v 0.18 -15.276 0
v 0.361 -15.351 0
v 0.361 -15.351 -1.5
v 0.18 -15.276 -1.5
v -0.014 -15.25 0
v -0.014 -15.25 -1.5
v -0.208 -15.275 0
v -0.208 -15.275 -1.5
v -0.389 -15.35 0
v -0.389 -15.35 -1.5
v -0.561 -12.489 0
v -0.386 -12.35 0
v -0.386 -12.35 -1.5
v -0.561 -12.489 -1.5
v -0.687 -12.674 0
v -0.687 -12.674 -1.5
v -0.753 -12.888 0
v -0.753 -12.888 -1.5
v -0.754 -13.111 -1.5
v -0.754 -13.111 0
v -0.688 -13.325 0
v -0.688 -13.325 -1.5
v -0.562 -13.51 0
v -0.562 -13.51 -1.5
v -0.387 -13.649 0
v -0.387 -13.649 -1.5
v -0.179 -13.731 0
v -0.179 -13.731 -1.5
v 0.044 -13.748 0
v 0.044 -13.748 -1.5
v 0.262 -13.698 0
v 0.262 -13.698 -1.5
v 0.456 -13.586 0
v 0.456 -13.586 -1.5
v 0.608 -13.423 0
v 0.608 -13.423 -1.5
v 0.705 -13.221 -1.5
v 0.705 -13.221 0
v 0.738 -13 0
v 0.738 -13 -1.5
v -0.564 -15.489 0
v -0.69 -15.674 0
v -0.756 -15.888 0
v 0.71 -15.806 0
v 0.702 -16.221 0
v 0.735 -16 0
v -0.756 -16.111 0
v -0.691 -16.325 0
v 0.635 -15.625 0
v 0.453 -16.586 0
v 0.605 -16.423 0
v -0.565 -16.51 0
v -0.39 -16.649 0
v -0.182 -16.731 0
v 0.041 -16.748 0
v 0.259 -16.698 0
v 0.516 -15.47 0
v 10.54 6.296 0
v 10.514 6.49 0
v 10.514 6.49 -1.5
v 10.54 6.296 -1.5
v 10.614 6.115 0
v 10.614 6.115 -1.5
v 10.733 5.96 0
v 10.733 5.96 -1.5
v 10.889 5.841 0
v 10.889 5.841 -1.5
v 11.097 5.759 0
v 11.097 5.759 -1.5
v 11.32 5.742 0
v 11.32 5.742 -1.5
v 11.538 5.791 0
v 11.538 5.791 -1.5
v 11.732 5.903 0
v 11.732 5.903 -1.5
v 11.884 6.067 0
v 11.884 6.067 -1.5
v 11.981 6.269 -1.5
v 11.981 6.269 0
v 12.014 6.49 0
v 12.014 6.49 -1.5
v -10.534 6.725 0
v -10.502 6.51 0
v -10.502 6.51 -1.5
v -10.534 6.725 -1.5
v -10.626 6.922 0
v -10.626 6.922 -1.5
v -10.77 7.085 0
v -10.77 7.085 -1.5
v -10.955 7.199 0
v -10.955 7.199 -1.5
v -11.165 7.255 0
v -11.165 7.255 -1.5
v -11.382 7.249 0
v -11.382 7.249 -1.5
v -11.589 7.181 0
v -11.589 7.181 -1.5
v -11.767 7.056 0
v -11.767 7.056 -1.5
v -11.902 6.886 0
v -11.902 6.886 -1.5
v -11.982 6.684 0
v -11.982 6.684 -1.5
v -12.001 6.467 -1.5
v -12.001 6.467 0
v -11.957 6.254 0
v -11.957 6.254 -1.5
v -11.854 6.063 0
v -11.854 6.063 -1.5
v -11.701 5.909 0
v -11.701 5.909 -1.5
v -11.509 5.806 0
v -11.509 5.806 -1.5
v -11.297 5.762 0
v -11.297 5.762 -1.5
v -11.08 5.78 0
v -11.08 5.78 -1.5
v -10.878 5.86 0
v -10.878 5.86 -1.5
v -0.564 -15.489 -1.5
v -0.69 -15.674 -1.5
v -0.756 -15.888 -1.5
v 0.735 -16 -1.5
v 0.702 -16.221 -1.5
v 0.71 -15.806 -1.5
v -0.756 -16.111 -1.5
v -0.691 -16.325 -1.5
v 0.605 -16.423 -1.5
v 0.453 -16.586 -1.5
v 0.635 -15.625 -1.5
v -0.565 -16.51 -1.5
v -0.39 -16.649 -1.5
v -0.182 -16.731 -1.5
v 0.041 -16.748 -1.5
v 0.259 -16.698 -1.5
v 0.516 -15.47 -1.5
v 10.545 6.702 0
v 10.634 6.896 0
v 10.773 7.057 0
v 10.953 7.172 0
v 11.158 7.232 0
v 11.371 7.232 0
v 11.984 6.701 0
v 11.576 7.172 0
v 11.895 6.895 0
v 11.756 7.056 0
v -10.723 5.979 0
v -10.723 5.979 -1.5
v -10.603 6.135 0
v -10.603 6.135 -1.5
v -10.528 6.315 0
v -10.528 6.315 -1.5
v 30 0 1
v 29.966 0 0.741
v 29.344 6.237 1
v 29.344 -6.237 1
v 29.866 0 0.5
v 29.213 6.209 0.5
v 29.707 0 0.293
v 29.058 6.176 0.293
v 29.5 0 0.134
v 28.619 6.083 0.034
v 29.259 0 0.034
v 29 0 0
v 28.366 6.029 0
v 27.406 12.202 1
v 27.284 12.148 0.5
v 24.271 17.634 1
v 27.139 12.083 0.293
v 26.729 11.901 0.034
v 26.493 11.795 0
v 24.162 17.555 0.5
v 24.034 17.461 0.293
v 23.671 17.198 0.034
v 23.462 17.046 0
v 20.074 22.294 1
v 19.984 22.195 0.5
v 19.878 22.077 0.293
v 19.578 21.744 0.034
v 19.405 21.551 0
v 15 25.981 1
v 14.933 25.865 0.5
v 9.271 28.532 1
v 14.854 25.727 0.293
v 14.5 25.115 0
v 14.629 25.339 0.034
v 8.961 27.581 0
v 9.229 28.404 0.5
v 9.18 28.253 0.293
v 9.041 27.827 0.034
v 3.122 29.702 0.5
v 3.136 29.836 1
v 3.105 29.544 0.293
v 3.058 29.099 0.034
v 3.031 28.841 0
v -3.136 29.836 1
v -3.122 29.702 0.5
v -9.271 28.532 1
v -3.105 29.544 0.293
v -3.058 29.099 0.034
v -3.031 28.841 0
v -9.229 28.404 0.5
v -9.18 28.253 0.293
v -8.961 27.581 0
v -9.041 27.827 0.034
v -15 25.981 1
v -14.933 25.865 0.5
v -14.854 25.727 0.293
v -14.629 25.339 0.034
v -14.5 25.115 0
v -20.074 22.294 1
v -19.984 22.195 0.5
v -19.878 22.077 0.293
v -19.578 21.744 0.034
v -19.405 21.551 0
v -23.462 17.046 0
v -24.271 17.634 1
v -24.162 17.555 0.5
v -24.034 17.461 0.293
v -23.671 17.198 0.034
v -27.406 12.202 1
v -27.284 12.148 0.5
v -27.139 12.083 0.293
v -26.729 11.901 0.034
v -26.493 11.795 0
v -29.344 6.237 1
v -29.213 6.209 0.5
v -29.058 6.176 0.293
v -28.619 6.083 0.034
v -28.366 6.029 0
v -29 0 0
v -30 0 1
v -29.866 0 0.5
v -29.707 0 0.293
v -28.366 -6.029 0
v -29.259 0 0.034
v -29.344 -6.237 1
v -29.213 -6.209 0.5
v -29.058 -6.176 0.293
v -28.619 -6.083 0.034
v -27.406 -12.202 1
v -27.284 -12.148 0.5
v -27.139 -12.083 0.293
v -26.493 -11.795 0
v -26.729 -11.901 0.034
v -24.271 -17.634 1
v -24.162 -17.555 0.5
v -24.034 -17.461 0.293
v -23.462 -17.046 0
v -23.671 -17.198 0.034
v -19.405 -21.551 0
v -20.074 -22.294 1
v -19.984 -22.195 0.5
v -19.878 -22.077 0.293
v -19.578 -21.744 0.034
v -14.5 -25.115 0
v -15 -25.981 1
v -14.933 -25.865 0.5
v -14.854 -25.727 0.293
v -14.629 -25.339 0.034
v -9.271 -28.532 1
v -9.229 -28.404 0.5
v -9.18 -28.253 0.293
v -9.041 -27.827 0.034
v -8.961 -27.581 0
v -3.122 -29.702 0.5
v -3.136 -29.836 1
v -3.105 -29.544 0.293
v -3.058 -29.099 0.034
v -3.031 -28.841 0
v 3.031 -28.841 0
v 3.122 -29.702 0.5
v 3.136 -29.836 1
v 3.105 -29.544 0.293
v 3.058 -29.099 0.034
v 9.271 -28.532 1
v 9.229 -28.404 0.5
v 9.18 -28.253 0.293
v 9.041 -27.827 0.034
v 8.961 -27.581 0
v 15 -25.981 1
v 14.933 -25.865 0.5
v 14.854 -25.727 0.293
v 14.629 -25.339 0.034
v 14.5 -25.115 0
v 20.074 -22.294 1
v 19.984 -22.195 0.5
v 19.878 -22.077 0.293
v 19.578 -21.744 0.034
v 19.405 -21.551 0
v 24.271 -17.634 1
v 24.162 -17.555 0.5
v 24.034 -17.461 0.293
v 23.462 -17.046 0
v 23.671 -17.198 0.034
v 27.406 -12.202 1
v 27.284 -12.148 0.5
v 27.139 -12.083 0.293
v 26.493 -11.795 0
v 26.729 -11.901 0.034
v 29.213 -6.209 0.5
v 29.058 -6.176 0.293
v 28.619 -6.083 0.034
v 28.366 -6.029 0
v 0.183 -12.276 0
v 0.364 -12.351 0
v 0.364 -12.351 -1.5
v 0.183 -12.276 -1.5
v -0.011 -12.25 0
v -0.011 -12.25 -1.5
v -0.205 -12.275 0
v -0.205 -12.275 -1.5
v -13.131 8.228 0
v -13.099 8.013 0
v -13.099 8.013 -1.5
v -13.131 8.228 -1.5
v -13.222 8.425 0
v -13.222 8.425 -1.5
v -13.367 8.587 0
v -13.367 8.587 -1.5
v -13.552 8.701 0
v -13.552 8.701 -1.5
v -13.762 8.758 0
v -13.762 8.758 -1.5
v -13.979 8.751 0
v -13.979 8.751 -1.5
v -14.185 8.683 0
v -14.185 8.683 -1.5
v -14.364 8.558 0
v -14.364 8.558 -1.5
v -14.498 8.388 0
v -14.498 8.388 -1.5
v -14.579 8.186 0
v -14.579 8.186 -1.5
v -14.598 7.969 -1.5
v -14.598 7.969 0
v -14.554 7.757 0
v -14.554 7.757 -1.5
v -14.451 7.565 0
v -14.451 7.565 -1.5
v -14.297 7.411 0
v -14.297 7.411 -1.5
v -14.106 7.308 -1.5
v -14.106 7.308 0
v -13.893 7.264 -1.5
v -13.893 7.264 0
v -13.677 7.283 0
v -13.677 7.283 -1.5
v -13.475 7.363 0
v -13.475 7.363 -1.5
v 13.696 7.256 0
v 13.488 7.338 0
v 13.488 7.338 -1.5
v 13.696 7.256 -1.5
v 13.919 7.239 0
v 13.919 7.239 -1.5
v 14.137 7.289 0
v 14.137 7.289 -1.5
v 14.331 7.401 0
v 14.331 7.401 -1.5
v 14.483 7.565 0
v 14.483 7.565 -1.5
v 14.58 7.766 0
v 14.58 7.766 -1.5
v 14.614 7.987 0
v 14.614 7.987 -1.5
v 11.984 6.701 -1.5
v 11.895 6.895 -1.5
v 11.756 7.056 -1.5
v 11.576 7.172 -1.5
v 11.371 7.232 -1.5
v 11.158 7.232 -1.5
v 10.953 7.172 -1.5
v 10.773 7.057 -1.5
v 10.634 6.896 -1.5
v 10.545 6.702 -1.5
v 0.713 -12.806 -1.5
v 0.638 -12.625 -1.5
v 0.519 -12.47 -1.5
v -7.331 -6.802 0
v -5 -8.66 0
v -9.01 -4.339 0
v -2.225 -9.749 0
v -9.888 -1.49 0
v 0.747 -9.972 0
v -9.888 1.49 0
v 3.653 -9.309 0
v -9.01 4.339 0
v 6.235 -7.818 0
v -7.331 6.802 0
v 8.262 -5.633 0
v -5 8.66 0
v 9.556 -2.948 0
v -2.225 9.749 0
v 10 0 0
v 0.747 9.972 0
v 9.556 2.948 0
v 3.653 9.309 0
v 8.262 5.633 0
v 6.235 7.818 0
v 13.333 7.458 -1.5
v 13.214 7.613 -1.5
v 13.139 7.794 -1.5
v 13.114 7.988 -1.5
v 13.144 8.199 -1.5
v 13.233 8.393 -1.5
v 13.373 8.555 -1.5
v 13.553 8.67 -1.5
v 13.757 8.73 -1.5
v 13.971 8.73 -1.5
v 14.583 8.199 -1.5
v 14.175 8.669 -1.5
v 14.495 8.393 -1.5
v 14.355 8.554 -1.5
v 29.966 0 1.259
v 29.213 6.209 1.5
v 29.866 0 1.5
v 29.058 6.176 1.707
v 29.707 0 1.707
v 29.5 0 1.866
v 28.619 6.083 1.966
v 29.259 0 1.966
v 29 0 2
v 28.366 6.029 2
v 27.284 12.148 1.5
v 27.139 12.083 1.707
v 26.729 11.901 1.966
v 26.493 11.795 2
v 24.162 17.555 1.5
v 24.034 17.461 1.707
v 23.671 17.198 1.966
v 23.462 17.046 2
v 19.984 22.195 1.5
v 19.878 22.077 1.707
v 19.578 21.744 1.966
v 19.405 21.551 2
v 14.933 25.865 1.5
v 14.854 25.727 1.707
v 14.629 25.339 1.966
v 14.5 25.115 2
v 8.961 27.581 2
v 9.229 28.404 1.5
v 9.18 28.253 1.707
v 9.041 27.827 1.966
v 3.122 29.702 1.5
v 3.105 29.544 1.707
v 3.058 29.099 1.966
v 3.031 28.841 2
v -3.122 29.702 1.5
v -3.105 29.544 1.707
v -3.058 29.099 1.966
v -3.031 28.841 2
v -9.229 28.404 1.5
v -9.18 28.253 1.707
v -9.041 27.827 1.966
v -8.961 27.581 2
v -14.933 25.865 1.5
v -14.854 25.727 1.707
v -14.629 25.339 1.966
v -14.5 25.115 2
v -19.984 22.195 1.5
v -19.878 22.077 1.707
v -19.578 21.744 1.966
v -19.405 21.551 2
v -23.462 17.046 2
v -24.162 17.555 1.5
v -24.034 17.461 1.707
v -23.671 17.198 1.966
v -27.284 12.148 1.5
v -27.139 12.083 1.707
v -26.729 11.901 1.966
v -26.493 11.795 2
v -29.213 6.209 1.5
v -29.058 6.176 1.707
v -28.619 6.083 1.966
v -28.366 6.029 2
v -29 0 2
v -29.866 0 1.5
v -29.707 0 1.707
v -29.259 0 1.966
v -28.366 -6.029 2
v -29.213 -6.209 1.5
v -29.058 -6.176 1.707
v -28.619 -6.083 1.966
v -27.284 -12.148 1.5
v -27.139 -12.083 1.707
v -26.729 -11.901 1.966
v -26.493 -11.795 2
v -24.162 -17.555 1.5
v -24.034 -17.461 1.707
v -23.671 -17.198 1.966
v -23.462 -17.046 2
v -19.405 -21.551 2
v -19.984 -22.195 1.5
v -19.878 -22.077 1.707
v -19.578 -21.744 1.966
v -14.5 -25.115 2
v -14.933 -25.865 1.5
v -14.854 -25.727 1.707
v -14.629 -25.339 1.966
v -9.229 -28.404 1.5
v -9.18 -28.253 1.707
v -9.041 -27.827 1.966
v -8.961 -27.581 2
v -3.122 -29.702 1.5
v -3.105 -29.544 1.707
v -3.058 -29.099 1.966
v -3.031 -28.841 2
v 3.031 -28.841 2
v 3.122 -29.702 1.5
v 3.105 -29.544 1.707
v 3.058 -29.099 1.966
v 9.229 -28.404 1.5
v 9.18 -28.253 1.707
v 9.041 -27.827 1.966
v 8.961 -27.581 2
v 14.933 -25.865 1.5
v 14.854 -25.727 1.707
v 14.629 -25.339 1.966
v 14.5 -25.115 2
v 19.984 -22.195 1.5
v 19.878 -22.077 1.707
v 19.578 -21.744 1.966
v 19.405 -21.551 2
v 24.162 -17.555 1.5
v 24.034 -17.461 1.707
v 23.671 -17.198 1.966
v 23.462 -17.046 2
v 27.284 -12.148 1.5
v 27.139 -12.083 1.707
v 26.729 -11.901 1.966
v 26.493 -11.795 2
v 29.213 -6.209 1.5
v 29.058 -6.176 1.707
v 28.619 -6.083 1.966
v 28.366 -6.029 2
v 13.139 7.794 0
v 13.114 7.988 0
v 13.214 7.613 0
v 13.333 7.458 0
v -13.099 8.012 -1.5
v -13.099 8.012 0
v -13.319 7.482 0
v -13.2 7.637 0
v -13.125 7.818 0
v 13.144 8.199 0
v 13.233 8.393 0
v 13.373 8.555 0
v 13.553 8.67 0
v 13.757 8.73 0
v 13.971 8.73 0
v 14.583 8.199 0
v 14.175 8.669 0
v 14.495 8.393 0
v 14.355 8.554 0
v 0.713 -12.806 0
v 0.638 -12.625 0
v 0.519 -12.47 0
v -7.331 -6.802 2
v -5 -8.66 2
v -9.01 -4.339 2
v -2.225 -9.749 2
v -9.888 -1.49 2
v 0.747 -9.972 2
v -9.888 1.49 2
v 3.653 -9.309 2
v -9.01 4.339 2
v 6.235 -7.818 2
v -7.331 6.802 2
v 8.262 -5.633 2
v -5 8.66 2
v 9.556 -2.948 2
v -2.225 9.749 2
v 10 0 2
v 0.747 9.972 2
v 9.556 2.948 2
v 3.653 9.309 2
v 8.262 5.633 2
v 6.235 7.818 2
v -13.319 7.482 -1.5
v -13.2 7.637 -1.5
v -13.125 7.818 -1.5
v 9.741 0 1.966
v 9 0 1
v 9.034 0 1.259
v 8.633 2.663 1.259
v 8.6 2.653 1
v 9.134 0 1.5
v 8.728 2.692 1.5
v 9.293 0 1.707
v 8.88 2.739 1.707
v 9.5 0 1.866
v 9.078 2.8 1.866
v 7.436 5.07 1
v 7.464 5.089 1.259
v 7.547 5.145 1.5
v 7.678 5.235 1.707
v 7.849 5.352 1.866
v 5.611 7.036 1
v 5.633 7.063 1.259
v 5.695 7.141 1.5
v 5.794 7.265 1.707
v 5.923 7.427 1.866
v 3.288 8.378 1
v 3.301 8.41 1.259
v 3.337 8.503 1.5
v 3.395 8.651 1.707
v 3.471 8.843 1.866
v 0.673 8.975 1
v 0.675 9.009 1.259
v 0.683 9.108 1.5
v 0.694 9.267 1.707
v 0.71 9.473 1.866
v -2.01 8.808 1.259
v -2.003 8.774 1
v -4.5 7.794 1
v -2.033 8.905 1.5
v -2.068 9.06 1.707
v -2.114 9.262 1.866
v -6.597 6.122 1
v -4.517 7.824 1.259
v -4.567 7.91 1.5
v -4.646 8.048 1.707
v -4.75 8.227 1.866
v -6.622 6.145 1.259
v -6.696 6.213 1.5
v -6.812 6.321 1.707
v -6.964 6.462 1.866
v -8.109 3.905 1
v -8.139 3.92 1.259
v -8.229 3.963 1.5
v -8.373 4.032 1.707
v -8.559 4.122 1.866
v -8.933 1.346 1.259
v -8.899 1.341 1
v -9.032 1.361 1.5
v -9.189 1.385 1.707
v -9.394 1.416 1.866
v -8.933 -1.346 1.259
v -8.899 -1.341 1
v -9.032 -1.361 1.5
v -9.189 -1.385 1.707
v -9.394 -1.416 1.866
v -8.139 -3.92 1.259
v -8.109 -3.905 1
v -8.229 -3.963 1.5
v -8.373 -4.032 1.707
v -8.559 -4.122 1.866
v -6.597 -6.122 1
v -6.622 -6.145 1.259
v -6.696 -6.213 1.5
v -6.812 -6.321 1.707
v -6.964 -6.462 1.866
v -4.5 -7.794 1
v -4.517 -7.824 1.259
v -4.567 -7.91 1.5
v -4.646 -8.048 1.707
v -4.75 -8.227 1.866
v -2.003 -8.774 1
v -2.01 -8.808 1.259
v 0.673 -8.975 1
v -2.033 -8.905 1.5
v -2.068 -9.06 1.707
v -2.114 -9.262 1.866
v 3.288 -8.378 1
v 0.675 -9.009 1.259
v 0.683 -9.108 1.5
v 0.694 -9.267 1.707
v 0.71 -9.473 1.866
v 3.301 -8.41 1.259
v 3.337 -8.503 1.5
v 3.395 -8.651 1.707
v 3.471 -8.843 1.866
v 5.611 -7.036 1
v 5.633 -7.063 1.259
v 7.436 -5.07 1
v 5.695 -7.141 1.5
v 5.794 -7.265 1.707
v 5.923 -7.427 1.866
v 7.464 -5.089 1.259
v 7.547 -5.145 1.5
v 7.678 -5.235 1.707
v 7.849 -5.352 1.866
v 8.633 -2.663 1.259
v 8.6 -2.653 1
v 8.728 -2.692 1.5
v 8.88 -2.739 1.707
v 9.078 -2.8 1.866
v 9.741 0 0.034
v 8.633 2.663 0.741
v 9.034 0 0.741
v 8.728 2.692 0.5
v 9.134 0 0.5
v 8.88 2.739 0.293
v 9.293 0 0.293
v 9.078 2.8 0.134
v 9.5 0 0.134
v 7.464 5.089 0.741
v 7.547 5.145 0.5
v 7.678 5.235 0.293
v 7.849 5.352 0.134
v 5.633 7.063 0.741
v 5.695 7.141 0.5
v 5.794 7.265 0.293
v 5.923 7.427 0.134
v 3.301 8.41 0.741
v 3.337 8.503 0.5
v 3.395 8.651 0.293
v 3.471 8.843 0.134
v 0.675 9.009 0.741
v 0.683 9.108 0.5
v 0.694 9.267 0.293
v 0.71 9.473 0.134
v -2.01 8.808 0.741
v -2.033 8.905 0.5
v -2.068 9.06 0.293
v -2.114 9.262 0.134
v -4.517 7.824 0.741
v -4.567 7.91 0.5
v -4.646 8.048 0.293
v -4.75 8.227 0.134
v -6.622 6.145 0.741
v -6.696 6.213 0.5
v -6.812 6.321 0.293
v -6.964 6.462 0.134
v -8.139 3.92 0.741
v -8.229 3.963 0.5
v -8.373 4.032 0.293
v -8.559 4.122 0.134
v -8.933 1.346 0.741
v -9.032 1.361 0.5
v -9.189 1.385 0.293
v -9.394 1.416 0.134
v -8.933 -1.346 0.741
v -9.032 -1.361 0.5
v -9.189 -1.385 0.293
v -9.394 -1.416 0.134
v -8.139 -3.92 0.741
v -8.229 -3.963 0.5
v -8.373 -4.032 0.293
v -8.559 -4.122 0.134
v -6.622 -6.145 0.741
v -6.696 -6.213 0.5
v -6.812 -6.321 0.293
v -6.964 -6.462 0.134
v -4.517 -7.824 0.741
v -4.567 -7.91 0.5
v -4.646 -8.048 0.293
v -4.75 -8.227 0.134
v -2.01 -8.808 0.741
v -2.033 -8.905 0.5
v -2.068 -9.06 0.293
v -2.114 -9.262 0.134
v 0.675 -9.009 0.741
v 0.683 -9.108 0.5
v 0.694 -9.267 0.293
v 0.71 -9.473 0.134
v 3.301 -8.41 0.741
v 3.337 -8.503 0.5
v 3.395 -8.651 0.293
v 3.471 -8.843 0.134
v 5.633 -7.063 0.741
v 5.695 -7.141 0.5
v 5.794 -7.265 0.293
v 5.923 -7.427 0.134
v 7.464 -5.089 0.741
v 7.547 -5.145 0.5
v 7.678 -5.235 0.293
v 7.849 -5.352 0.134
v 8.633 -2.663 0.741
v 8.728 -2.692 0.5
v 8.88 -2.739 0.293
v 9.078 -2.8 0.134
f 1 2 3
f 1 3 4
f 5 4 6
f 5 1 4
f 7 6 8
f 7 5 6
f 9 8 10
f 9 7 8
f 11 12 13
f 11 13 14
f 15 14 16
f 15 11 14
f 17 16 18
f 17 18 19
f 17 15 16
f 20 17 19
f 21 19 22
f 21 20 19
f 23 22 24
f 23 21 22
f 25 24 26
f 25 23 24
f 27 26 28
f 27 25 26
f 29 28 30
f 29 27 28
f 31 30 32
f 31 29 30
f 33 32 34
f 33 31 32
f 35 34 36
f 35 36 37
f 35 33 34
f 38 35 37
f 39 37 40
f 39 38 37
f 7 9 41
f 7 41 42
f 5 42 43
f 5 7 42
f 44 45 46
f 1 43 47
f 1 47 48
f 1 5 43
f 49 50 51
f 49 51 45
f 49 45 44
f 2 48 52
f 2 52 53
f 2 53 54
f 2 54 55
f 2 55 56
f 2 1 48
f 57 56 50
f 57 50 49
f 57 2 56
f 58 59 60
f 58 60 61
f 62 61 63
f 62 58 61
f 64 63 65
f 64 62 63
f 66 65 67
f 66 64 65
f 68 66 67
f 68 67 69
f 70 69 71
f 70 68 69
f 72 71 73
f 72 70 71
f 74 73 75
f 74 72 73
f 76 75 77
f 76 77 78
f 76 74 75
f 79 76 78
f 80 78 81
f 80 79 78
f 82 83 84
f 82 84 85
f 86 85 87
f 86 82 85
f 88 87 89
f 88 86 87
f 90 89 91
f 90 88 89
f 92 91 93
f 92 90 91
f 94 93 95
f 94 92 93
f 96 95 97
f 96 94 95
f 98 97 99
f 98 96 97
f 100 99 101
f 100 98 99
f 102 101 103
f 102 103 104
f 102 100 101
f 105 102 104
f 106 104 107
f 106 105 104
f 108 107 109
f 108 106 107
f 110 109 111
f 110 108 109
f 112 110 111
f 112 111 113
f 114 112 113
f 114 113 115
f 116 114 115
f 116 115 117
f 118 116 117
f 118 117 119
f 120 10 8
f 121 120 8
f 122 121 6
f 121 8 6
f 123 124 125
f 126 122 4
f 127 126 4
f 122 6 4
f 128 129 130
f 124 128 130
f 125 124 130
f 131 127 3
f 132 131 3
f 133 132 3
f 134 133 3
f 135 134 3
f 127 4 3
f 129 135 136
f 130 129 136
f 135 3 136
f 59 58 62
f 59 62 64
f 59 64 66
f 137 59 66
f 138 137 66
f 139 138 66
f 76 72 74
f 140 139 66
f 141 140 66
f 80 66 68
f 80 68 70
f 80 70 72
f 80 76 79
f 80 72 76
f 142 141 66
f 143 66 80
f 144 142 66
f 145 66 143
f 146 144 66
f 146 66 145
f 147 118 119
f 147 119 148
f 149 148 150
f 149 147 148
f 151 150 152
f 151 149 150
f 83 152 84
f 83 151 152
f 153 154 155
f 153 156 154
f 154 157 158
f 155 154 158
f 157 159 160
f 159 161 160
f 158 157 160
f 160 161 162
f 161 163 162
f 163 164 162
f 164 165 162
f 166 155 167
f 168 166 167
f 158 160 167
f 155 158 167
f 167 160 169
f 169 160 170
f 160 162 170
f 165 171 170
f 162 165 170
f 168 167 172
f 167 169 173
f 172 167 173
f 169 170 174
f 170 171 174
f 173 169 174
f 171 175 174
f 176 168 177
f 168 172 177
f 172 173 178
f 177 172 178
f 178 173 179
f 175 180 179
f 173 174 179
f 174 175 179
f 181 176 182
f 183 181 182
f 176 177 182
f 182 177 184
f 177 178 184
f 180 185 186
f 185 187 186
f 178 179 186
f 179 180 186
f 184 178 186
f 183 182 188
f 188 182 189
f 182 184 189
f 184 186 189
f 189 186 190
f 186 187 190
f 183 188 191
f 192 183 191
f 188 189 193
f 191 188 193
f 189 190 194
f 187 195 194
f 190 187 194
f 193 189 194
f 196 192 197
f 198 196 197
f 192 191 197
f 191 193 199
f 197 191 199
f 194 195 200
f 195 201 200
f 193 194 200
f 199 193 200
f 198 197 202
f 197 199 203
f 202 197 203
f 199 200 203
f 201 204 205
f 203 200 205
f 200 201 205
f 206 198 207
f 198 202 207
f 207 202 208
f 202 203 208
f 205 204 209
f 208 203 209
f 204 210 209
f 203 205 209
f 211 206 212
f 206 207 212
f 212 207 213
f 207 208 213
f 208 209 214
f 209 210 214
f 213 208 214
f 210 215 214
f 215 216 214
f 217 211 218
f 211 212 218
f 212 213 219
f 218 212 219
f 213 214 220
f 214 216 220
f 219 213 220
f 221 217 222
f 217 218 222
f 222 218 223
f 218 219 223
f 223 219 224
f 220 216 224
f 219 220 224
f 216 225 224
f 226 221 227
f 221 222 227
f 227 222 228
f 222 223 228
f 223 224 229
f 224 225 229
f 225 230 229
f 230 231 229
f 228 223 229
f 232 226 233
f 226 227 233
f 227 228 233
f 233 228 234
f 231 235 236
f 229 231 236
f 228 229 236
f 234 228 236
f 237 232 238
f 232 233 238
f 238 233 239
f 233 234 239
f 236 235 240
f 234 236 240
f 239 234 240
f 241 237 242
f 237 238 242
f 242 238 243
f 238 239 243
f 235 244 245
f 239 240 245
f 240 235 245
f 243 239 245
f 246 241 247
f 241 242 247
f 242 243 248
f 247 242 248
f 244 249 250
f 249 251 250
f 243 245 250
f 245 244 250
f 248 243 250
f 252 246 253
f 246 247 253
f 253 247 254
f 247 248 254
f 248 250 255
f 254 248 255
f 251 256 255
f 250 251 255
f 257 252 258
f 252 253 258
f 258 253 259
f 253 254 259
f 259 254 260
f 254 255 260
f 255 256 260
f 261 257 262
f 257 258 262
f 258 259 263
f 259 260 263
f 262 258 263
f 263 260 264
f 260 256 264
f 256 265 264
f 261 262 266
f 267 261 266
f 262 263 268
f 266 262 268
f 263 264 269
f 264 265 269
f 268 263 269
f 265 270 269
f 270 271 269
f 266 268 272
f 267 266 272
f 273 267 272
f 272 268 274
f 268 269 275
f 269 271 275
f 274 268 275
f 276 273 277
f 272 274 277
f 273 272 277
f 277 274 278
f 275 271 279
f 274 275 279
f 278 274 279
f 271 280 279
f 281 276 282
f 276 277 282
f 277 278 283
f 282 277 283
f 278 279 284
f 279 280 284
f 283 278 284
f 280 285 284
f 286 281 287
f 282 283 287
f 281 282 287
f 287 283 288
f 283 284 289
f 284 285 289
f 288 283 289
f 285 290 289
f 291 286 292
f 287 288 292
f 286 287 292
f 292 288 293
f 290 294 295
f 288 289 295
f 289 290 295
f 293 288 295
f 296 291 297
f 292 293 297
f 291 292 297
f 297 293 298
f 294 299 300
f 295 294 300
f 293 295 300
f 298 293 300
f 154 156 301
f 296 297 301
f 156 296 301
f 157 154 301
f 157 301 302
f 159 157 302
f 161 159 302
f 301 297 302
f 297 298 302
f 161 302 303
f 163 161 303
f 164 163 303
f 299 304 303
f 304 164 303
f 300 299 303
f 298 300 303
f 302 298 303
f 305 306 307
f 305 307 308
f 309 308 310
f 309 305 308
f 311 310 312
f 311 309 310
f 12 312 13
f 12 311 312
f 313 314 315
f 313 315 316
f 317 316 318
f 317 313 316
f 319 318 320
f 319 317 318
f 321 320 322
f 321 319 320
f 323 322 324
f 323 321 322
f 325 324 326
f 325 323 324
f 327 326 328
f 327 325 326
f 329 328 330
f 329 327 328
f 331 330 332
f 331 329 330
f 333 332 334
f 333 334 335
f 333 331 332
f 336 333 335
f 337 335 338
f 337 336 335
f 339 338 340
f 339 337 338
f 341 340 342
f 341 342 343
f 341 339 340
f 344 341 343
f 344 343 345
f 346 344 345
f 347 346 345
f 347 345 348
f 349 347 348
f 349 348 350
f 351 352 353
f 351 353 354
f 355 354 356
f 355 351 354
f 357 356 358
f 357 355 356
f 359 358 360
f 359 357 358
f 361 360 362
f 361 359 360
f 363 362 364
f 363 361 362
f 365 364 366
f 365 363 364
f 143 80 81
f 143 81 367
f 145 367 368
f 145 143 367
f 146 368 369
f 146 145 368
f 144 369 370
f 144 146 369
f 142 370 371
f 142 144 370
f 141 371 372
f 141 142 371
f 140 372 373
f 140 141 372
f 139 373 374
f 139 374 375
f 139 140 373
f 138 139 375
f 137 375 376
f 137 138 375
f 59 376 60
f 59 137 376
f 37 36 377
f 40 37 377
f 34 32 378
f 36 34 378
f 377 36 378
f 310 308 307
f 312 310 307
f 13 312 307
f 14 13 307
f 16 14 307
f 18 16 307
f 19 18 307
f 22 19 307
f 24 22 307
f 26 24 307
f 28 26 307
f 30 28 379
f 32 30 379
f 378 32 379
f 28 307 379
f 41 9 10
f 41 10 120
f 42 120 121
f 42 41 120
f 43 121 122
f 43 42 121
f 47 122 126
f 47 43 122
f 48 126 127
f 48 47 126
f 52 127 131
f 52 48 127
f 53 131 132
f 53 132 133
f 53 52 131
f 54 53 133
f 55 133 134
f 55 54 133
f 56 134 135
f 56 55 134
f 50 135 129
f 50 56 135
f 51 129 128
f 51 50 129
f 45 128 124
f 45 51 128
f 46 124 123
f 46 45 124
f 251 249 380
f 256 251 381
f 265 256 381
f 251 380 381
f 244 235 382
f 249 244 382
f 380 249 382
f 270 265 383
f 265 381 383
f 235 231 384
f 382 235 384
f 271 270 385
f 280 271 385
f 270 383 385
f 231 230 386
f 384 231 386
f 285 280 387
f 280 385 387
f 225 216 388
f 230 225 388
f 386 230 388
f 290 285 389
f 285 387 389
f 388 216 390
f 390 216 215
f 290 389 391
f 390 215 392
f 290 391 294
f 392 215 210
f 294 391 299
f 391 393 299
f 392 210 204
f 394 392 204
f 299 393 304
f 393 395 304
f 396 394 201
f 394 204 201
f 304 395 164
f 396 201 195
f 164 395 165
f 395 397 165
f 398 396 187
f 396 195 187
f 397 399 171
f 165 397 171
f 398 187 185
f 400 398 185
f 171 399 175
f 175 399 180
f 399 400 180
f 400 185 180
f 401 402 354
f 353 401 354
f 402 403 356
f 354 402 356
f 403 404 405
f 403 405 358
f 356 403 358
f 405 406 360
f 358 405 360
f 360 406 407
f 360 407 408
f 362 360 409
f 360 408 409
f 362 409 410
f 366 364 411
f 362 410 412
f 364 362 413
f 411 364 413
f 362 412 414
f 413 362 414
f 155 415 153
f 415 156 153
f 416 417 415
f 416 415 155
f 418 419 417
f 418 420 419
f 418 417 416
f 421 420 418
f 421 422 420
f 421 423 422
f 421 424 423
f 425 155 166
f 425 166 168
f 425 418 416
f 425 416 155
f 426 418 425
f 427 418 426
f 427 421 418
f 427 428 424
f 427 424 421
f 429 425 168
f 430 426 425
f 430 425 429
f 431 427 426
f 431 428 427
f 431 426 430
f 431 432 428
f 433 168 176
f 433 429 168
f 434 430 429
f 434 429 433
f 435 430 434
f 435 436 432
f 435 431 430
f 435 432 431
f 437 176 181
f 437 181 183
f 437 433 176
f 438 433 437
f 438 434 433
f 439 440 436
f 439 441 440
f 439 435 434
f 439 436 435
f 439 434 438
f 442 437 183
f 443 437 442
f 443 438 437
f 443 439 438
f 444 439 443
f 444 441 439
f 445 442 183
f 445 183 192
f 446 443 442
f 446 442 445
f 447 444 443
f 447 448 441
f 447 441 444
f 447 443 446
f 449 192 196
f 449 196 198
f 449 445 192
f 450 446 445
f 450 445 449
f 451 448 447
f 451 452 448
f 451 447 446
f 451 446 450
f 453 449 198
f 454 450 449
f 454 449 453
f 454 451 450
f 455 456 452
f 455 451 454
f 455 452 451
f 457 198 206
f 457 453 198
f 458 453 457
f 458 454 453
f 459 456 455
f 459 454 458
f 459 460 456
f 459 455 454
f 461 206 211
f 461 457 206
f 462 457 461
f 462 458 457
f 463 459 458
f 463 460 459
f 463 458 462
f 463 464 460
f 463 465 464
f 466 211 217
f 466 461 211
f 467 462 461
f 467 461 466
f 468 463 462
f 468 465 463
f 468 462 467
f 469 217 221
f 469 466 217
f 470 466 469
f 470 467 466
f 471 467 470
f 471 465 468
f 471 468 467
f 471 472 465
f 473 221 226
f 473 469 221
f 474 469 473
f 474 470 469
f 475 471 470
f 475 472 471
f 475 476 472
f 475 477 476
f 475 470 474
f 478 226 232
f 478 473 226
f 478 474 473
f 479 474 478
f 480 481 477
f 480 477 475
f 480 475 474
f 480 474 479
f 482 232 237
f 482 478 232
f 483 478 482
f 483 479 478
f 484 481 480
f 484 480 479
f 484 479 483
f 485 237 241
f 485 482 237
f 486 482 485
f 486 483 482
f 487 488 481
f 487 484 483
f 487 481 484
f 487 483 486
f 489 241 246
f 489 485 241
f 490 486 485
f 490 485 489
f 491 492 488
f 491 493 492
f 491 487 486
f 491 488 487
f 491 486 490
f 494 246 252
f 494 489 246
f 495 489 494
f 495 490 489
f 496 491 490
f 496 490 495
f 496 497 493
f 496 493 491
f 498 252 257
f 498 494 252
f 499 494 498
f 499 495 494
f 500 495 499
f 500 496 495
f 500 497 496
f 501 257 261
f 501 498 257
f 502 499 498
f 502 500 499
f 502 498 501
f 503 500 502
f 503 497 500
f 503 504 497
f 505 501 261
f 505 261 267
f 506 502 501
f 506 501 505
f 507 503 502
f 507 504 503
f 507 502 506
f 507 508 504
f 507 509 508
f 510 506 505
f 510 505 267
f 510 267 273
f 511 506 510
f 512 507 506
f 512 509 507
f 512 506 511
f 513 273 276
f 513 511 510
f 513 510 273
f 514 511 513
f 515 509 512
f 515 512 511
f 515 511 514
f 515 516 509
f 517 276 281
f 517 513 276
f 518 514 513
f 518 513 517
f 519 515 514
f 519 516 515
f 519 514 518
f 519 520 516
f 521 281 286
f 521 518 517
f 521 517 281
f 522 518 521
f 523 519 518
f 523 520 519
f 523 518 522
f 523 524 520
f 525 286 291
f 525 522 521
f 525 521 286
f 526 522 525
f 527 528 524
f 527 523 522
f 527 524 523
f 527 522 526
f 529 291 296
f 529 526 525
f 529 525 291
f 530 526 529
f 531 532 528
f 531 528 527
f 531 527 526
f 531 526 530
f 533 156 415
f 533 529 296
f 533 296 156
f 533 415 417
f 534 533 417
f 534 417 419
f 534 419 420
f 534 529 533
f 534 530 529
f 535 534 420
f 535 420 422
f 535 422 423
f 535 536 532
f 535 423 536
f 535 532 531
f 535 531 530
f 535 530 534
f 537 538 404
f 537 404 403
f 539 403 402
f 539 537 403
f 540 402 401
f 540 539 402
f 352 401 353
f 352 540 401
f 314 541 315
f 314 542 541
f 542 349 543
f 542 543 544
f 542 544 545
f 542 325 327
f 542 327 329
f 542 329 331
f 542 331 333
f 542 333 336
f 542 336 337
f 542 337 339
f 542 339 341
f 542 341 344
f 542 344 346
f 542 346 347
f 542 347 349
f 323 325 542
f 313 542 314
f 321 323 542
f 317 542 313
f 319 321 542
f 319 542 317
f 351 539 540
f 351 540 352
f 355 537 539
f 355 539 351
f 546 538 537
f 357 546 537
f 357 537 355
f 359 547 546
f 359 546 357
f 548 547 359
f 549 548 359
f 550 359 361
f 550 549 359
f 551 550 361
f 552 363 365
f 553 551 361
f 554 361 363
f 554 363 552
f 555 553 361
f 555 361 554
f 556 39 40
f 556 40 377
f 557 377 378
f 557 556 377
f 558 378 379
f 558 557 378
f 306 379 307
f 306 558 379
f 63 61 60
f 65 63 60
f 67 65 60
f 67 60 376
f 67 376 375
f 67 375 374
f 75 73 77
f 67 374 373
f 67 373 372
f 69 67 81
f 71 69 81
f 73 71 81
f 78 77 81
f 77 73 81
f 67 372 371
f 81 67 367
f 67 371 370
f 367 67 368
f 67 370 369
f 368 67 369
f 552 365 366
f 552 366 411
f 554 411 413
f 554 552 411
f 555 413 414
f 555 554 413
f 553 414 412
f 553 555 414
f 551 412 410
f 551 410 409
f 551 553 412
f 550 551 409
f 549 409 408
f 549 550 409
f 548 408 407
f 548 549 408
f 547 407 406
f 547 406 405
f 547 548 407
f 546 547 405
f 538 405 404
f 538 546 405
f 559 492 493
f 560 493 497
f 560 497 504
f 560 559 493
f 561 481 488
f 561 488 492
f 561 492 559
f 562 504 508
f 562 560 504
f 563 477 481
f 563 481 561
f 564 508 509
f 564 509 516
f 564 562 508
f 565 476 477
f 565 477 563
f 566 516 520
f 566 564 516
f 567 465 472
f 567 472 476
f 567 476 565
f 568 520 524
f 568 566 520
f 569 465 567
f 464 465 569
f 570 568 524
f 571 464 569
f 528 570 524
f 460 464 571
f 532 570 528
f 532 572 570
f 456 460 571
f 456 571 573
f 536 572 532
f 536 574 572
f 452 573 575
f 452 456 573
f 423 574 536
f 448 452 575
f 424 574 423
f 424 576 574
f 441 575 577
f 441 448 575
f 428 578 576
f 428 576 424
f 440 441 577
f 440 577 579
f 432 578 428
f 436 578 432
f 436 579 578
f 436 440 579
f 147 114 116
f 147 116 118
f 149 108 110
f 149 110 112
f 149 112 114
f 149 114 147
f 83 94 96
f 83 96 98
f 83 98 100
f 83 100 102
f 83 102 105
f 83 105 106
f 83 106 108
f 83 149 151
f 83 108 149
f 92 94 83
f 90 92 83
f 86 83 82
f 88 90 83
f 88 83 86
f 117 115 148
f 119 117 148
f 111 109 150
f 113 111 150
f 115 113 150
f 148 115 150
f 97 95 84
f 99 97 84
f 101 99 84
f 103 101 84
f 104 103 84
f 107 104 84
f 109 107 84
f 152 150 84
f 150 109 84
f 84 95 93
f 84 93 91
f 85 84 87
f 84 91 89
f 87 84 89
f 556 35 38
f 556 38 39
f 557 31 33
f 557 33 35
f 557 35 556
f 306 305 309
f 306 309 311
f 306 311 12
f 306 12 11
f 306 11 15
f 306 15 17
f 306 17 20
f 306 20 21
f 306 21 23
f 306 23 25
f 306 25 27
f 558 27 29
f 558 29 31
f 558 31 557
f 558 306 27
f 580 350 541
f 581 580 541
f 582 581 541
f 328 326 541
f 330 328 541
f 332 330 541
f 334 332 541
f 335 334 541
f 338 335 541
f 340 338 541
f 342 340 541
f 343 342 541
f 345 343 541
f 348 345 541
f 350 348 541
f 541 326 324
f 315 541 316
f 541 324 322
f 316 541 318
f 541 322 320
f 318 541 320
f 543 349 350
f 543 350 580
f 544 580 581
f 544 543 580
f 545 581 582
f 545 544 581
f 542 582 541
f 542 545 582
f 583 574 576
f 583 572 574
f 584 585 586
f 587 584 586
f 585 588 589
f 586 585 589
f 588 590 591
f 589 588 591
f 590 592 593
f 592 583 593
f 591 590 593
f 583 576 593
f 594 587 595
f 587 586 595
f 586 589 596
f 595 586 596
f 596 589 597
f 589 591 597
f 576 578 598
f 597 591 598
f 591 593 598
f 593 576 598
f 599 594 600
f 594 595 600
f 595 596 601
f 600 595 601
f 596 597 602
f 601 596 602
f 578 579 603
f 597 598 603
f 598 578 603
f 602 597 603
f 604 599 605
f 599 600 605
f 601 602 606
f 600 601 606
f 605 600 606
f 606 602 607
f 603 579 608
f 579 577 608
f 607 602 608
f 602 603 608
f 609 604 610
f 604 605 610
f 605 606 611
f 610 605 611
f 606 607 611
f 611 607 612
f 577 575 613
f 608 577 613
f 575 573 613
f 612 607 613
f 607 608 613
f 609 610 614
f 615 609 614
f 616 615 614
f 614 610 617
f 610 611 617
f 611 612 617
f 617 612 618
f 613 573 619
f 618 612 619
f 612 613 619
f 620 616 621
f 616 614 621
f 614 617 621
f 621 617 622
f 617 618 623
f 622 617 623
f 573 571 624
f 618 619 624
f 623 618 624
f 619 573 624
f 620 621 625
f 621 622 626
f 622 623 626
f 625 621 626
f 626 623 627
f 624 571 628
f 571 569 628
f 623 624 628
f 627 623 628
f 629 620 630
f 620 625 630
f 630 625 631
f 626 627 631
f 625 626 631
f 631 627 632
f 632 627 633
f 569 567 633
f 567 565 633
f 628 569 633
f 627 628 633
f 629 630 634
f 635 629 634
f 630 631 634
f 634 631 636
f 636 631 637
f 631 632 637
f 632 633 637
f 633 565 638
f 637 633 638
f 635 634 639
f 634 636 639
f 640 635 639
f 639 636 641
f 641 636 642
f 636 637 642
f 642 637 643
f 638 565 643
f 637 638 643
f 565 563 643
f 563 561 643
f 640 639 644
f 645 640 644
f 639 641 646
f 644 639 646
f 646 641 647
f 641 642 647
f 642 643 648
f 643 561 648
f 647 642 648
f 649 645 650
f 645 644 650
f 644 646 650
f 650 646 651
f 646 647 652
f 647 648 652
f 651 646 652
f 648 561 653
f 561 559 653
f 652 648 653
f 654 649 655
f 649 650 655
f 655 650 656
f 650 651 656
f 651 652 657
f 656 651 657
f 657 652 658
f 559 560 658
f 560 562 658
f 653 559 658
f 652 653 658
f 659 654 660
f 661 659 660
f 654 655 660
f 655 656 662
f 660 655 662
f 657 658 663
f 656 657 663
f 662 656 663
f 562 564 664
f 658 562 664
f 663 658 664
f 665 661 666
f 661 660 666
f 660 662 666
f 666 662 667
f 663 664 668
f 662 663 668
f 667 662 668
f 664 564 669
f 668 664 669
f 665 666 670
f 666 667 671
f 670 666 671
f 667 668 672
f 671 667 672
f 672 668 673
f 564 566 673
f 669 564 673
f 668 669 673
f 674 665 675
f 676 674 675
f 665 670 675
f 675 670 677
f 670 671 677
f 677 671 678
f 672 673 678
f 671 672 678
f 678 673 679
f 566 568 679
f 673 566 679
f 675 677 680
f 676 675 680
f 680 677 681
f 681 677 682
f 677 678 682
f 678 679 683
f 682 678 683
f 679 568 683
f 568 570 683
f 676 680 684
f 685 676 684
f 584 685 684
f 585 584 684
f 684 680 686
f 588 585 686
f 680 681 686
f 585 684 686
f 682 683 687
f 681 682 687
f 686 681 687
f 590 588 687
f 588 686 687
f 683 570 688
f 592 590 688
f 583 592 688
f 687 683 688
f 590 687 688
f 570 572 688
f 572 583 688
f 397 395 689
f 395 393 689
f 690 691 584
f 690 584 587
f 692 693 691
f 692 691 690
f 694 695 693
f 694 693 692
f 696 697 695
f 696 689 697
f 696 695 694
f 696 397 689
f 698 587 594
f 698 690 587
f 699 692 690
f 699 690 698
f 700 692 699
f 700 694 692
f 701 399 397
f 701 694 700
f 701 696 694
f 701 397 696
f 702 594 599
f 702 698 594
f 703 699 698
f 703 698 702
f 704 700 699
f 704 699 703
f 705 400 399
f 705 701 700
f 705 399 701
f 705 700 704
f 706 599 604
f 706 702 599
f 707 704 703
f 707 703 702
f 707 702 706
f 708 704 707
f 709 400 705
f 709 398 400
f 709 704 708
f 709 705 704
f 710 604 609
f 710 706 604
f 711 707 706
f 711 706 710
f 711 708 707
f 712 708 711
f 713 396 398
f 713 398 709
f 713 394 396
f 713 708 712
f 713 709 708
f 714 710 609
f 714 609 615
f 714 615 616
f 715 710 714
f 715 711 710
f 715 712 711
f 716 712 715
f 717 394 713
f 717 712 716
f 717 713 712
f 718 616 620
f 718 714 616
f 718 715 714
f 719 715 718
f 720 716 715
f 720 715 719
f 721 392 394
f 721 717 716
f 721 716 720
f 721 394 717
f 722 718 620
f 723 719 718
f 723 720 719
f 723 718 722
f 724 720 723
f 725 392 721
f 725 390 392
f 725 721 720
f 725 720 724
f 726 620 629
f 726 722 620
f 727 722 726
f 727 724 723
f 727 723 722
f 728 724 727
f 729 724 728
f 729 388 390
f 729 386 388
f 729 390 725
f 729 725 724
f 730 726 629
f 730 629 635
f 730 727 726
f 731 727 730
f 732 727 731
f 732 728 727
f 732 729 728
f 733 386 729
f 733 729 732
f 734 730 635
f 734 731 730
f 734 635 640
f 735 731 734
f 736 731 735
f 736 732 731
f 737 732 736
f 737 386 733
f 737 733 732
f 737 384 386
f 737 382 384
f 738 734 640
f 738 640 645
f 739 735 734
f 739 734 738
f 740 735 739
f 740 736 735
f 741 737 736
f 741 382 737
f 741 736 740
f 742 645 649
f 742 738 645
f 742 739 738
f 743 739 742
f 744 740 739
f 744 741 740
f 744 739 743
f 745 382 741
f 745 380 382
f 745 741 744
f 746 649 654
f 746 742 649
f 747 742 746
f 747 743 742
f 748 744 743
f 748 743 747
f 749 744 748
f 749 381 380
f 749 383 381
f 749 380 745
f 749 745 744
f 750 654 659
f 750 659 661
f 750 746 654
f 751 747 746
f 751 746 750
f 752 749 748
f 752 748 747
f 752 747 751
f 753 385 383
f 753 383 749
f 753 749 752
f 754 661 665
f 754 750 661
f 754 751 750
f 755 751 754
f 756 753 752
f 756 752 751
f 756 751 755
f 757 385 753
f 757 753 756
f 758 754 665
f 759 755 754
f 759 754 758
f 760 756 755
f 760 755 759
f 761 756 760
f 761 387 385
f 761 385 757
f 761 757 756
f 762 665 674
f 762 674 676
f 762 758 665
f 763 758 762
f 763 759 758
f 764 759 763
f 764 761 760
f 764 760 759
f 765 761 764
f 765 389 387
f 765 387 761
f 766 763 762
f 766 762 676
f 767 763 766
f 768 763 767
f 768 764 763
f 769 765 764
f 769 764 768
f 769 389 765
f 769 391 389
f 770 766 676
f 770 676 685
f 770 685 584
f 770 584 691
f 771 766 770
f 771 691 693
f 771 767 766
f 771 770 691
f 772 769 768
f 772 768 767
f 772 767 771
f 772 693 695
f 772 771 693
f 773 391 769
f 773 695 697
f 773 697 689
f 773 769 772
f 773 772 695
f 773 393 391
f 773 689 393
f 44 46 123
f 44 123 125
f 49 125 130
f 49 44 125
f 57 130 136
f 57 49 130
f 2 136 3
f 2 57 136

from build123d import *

# Parameters (mm, degrees)
F0_R     = 30
F0_R_2   = 9
F1_DEPTH = 2
F2_R     = 0.99999
F4_DEPTH = 1.5


# Not quite as in the source:
# - a fillet or chamfer is up to 0.001 mm smaller than in the source, because OpenCascade refuses the exact size


with BuildPart() as f1:
    # F0 (on Top) → F1 (new body)
    with BuildSketch(Plane.XY):
        Circle(F0_R)
        Circle(F0_R_2, mode=Mode.SUBTRACT)
    extrude(amount=F1_DEPTH)

    # F2 (radius 1 in the source; OpenCascade refuses exactly that, so slightly less here)
    f2_edges = [f1.edges().sort_by_distance(p)[0] for p in [
        (-9, 0, 2),
        (-9, 0, 0),
        (-30, 0, 0),
        (-30, 0, 2),
    ]]
    fillet(f2_edges, radius=F2_R)


with BuildPart() as f4:
    # F3 (on Top) → F4 (new body)
    with BuildSketch(Plane.XY):
        with BuildLine():
            Line((13.1136951927, 7.9880466137), (13.863694881, 7.9873627843))
            Line((13.863694881, 7.9873627843), (13.4881028232, 7.3381859161))
            ThreePointArc((13.4881028232, 7.3381859161), (14.2383987351, 7.3376728416), (14.613694881, 7.9873627843))
            ThreePointArc((14.613694881, 7.9873627843), (13.8640367957, 8.7373627064), (13.1136951927, 7.9880466137))
        make_face()
        with BuildLine():
            Line((13.4881028232, 7.3381859161), (13.863694881, 7.9873627843))
            Line((13.863694881, 7.9873627843), (13.1136951927, 7.9880466137))
            ThreePointArc((13.1136951927, 7.9880466137), (13.2138341834, 7.6129551538), (13.4881028232, 7.3381859161))
        make_face()
    extrude(amount=-F4_DEPTH)


with BuildPart() as f4b:
    # F3 (on Top) → F4, piece 2 (new body)
    with BuildSketch(Plane.XY):
        with BuildLine():
            Line((10.5142524025, 6.4904160916), (11.2642520908, 6.4897322622))
            Line((11.2642520908, 6.4897322622), (10.888660033, 5.8405553941))
            ThreePointArc((10.888660033, 5.8405553941), (11.638955945, 5.8400423195), (12.0142520908, 6.4897322622))
            ThreePointArc((12.0142520908, 6.4897322622), (11.2645940055, 7.2397321843), (10.5142524025, 6.4904160916))
        make_face()
        with BuildLine():
            Line((10.888660033, 5.8405553941), (11.2642520908, 6.4897322622))
            Line((11.2642520908, 6.4897322622), (10.5142524025, 6.4904160916))
            ThreePointArc((10.5142524025, 6.4904160916), (10.6143913932, 6.1153246317), (10.888660033, 5.8405553941))
        make_face()
    extrude(amount=-F4_DEPTH)


with BuildPart() as f4c:
    # F3 (on Top) → F4, piece 3 (new body)
    with BuildSketch(Plane.XY):
        with BuildLine():
            ThreePointArc((-13.4746988904, 7.3627698675), (-13.1999296527, 7.6370385073), (-13.0991068327, 8.0119467357))
            Line((-13.0991068327, 8.0119467357), (-13.8491065209, 8.0126305651))
            Line((-13.8491065209, 8.0126305651), (-13.4746988904, 7.3627698675))
        make_face()
        with BuildLine():
            Line((-13.8491065209, 8.0126305651), (-13.0991068327, 8.0119467357))
            ThreePointArc((-13.0991068327, 8.0119467357), (-13.0991065989, 8.0122886504), (-13.0991065209, 8.0126305651))
            ThreePointArc((-13.0991065209, 8.0126305651), (-14.4984545489, 8.3879266329), (-13.4746988904, 7.3627698675))
            Line((-13.4746988904, 7.3627698675), (-13.8491065209, 8.0126305651))
        make_face()
    extrude(amount=-F4_DEPTH)


with BuildPart() as f4d:
    # F3 (on Top) → F4, piece 4 (new body)
    with BuildSketch(Plane.XY):
        with BuildLine():
            Line((-11.2523990482, 6.5102623341), (-10.50239936, 6.5095785047))
            ThreePointArc((-10.50239936, 6.5095785047), (-10.5023991262, 6.5099204194), (-10.5023990482, 6.5102623341))
            ThreePointArc((-10.5023990482, 6.5102623341), (-11.9017470762, 6.885558402), (-10.8779914177, 5.8604016366))
            Line((-10.8779914177, 5.8604016366), (-11.2523990482, 6.5102623341))
        make_face()
        with BuildLine():
            ThreePointArc((-10.8779914177, 5.8604016366), (-10.6032221801, 6.1346702764), (-10.50239936, 6.5095785047))
            Line((-10.50239936, 6.5095785047), (-11.2523990482, 6.5102623341))
            Line((-11.2523990482, 6.5102623341), (-10.8779914177, 5.8604016366))
        make_face()
    extrude(amount=-F4_DEPTH)


with BuildPart() as f4e:
    # F3 (on Top) → F4, piece 5 (new body)
    with BuildSketch(Plane.XY):
        with BuildLine():
            ThreePointArc((0.7381469575, -12.9999945964), (0.6378369002, -12.6252907422), (0.3637390152, -12.3508177282))
            Line((0.3637390152, -12.3508177282), (-0.0118530425, -12.9999945964))
            Line((-0.0118530425, -12.9999945964), (-0.386260673, -12.3501338988))
            ThreePointArc((-0.386260673, -12.3501338988), (-0.3871491104, -13.6493426243), (0.7381469575, -12.9999945964))
        make_face()
        with BuildLine():
            Line((-0.0118530425, -12.9999945964), (0.3637390152, -12.3508177282))
            ThreePointArc((0.3637390152, -12.3508177282), (-0.0111692132, -12.2499949081), (-0.386260673, -12.3501338988))
            Line((-0.386260673, -12.3501338988), (-0.0118530425, -12.9999945964))
        make_face()
    extrude(amount=-F4_DEPTH)


with BuildPart() as f4f:
    # F3 (on Top) → F4, piece 6 (new body)
    with BuildSketch(Plane.XY):
        with BuildLine():
            Line((-0.01458836, -15.9999933494), (0.3610036977, -15.3508164812))
            ThreePointArc((0.3610036977, -15.3508164812), (-0.0139045307, -15.2499936611), (-0.3889959906, -15.3501326518))
            Line((-0.3889959906, -15.3501326518), (-0.01458836, -15.9999933494))
        make_face()
        with BuildLine():
            ThreePointArc((0.73541164, -15.9999933494), (0.6351015827, -15.6252894952), (0.3610036977, -15.3508164812))
            Line((0.3610036977, -15.3508164812), (-0.01458836, -15.9999933494))
            Line((-0.01458836, -15.9999933494), (-0.3889959906, -15.3501326518))
            ThreePointArc((-0.3889959906, -15.3501326518), (-0.3898844279, -16.6493413773), (0.73541164, -15.9999933494))
        make_face()
    extrude(amount=-F4_DEPTH)


solid = Compound([f1.part, f4.part, f4b.part, f4c.part, f4d.part, f4e.part, f4f.part])
